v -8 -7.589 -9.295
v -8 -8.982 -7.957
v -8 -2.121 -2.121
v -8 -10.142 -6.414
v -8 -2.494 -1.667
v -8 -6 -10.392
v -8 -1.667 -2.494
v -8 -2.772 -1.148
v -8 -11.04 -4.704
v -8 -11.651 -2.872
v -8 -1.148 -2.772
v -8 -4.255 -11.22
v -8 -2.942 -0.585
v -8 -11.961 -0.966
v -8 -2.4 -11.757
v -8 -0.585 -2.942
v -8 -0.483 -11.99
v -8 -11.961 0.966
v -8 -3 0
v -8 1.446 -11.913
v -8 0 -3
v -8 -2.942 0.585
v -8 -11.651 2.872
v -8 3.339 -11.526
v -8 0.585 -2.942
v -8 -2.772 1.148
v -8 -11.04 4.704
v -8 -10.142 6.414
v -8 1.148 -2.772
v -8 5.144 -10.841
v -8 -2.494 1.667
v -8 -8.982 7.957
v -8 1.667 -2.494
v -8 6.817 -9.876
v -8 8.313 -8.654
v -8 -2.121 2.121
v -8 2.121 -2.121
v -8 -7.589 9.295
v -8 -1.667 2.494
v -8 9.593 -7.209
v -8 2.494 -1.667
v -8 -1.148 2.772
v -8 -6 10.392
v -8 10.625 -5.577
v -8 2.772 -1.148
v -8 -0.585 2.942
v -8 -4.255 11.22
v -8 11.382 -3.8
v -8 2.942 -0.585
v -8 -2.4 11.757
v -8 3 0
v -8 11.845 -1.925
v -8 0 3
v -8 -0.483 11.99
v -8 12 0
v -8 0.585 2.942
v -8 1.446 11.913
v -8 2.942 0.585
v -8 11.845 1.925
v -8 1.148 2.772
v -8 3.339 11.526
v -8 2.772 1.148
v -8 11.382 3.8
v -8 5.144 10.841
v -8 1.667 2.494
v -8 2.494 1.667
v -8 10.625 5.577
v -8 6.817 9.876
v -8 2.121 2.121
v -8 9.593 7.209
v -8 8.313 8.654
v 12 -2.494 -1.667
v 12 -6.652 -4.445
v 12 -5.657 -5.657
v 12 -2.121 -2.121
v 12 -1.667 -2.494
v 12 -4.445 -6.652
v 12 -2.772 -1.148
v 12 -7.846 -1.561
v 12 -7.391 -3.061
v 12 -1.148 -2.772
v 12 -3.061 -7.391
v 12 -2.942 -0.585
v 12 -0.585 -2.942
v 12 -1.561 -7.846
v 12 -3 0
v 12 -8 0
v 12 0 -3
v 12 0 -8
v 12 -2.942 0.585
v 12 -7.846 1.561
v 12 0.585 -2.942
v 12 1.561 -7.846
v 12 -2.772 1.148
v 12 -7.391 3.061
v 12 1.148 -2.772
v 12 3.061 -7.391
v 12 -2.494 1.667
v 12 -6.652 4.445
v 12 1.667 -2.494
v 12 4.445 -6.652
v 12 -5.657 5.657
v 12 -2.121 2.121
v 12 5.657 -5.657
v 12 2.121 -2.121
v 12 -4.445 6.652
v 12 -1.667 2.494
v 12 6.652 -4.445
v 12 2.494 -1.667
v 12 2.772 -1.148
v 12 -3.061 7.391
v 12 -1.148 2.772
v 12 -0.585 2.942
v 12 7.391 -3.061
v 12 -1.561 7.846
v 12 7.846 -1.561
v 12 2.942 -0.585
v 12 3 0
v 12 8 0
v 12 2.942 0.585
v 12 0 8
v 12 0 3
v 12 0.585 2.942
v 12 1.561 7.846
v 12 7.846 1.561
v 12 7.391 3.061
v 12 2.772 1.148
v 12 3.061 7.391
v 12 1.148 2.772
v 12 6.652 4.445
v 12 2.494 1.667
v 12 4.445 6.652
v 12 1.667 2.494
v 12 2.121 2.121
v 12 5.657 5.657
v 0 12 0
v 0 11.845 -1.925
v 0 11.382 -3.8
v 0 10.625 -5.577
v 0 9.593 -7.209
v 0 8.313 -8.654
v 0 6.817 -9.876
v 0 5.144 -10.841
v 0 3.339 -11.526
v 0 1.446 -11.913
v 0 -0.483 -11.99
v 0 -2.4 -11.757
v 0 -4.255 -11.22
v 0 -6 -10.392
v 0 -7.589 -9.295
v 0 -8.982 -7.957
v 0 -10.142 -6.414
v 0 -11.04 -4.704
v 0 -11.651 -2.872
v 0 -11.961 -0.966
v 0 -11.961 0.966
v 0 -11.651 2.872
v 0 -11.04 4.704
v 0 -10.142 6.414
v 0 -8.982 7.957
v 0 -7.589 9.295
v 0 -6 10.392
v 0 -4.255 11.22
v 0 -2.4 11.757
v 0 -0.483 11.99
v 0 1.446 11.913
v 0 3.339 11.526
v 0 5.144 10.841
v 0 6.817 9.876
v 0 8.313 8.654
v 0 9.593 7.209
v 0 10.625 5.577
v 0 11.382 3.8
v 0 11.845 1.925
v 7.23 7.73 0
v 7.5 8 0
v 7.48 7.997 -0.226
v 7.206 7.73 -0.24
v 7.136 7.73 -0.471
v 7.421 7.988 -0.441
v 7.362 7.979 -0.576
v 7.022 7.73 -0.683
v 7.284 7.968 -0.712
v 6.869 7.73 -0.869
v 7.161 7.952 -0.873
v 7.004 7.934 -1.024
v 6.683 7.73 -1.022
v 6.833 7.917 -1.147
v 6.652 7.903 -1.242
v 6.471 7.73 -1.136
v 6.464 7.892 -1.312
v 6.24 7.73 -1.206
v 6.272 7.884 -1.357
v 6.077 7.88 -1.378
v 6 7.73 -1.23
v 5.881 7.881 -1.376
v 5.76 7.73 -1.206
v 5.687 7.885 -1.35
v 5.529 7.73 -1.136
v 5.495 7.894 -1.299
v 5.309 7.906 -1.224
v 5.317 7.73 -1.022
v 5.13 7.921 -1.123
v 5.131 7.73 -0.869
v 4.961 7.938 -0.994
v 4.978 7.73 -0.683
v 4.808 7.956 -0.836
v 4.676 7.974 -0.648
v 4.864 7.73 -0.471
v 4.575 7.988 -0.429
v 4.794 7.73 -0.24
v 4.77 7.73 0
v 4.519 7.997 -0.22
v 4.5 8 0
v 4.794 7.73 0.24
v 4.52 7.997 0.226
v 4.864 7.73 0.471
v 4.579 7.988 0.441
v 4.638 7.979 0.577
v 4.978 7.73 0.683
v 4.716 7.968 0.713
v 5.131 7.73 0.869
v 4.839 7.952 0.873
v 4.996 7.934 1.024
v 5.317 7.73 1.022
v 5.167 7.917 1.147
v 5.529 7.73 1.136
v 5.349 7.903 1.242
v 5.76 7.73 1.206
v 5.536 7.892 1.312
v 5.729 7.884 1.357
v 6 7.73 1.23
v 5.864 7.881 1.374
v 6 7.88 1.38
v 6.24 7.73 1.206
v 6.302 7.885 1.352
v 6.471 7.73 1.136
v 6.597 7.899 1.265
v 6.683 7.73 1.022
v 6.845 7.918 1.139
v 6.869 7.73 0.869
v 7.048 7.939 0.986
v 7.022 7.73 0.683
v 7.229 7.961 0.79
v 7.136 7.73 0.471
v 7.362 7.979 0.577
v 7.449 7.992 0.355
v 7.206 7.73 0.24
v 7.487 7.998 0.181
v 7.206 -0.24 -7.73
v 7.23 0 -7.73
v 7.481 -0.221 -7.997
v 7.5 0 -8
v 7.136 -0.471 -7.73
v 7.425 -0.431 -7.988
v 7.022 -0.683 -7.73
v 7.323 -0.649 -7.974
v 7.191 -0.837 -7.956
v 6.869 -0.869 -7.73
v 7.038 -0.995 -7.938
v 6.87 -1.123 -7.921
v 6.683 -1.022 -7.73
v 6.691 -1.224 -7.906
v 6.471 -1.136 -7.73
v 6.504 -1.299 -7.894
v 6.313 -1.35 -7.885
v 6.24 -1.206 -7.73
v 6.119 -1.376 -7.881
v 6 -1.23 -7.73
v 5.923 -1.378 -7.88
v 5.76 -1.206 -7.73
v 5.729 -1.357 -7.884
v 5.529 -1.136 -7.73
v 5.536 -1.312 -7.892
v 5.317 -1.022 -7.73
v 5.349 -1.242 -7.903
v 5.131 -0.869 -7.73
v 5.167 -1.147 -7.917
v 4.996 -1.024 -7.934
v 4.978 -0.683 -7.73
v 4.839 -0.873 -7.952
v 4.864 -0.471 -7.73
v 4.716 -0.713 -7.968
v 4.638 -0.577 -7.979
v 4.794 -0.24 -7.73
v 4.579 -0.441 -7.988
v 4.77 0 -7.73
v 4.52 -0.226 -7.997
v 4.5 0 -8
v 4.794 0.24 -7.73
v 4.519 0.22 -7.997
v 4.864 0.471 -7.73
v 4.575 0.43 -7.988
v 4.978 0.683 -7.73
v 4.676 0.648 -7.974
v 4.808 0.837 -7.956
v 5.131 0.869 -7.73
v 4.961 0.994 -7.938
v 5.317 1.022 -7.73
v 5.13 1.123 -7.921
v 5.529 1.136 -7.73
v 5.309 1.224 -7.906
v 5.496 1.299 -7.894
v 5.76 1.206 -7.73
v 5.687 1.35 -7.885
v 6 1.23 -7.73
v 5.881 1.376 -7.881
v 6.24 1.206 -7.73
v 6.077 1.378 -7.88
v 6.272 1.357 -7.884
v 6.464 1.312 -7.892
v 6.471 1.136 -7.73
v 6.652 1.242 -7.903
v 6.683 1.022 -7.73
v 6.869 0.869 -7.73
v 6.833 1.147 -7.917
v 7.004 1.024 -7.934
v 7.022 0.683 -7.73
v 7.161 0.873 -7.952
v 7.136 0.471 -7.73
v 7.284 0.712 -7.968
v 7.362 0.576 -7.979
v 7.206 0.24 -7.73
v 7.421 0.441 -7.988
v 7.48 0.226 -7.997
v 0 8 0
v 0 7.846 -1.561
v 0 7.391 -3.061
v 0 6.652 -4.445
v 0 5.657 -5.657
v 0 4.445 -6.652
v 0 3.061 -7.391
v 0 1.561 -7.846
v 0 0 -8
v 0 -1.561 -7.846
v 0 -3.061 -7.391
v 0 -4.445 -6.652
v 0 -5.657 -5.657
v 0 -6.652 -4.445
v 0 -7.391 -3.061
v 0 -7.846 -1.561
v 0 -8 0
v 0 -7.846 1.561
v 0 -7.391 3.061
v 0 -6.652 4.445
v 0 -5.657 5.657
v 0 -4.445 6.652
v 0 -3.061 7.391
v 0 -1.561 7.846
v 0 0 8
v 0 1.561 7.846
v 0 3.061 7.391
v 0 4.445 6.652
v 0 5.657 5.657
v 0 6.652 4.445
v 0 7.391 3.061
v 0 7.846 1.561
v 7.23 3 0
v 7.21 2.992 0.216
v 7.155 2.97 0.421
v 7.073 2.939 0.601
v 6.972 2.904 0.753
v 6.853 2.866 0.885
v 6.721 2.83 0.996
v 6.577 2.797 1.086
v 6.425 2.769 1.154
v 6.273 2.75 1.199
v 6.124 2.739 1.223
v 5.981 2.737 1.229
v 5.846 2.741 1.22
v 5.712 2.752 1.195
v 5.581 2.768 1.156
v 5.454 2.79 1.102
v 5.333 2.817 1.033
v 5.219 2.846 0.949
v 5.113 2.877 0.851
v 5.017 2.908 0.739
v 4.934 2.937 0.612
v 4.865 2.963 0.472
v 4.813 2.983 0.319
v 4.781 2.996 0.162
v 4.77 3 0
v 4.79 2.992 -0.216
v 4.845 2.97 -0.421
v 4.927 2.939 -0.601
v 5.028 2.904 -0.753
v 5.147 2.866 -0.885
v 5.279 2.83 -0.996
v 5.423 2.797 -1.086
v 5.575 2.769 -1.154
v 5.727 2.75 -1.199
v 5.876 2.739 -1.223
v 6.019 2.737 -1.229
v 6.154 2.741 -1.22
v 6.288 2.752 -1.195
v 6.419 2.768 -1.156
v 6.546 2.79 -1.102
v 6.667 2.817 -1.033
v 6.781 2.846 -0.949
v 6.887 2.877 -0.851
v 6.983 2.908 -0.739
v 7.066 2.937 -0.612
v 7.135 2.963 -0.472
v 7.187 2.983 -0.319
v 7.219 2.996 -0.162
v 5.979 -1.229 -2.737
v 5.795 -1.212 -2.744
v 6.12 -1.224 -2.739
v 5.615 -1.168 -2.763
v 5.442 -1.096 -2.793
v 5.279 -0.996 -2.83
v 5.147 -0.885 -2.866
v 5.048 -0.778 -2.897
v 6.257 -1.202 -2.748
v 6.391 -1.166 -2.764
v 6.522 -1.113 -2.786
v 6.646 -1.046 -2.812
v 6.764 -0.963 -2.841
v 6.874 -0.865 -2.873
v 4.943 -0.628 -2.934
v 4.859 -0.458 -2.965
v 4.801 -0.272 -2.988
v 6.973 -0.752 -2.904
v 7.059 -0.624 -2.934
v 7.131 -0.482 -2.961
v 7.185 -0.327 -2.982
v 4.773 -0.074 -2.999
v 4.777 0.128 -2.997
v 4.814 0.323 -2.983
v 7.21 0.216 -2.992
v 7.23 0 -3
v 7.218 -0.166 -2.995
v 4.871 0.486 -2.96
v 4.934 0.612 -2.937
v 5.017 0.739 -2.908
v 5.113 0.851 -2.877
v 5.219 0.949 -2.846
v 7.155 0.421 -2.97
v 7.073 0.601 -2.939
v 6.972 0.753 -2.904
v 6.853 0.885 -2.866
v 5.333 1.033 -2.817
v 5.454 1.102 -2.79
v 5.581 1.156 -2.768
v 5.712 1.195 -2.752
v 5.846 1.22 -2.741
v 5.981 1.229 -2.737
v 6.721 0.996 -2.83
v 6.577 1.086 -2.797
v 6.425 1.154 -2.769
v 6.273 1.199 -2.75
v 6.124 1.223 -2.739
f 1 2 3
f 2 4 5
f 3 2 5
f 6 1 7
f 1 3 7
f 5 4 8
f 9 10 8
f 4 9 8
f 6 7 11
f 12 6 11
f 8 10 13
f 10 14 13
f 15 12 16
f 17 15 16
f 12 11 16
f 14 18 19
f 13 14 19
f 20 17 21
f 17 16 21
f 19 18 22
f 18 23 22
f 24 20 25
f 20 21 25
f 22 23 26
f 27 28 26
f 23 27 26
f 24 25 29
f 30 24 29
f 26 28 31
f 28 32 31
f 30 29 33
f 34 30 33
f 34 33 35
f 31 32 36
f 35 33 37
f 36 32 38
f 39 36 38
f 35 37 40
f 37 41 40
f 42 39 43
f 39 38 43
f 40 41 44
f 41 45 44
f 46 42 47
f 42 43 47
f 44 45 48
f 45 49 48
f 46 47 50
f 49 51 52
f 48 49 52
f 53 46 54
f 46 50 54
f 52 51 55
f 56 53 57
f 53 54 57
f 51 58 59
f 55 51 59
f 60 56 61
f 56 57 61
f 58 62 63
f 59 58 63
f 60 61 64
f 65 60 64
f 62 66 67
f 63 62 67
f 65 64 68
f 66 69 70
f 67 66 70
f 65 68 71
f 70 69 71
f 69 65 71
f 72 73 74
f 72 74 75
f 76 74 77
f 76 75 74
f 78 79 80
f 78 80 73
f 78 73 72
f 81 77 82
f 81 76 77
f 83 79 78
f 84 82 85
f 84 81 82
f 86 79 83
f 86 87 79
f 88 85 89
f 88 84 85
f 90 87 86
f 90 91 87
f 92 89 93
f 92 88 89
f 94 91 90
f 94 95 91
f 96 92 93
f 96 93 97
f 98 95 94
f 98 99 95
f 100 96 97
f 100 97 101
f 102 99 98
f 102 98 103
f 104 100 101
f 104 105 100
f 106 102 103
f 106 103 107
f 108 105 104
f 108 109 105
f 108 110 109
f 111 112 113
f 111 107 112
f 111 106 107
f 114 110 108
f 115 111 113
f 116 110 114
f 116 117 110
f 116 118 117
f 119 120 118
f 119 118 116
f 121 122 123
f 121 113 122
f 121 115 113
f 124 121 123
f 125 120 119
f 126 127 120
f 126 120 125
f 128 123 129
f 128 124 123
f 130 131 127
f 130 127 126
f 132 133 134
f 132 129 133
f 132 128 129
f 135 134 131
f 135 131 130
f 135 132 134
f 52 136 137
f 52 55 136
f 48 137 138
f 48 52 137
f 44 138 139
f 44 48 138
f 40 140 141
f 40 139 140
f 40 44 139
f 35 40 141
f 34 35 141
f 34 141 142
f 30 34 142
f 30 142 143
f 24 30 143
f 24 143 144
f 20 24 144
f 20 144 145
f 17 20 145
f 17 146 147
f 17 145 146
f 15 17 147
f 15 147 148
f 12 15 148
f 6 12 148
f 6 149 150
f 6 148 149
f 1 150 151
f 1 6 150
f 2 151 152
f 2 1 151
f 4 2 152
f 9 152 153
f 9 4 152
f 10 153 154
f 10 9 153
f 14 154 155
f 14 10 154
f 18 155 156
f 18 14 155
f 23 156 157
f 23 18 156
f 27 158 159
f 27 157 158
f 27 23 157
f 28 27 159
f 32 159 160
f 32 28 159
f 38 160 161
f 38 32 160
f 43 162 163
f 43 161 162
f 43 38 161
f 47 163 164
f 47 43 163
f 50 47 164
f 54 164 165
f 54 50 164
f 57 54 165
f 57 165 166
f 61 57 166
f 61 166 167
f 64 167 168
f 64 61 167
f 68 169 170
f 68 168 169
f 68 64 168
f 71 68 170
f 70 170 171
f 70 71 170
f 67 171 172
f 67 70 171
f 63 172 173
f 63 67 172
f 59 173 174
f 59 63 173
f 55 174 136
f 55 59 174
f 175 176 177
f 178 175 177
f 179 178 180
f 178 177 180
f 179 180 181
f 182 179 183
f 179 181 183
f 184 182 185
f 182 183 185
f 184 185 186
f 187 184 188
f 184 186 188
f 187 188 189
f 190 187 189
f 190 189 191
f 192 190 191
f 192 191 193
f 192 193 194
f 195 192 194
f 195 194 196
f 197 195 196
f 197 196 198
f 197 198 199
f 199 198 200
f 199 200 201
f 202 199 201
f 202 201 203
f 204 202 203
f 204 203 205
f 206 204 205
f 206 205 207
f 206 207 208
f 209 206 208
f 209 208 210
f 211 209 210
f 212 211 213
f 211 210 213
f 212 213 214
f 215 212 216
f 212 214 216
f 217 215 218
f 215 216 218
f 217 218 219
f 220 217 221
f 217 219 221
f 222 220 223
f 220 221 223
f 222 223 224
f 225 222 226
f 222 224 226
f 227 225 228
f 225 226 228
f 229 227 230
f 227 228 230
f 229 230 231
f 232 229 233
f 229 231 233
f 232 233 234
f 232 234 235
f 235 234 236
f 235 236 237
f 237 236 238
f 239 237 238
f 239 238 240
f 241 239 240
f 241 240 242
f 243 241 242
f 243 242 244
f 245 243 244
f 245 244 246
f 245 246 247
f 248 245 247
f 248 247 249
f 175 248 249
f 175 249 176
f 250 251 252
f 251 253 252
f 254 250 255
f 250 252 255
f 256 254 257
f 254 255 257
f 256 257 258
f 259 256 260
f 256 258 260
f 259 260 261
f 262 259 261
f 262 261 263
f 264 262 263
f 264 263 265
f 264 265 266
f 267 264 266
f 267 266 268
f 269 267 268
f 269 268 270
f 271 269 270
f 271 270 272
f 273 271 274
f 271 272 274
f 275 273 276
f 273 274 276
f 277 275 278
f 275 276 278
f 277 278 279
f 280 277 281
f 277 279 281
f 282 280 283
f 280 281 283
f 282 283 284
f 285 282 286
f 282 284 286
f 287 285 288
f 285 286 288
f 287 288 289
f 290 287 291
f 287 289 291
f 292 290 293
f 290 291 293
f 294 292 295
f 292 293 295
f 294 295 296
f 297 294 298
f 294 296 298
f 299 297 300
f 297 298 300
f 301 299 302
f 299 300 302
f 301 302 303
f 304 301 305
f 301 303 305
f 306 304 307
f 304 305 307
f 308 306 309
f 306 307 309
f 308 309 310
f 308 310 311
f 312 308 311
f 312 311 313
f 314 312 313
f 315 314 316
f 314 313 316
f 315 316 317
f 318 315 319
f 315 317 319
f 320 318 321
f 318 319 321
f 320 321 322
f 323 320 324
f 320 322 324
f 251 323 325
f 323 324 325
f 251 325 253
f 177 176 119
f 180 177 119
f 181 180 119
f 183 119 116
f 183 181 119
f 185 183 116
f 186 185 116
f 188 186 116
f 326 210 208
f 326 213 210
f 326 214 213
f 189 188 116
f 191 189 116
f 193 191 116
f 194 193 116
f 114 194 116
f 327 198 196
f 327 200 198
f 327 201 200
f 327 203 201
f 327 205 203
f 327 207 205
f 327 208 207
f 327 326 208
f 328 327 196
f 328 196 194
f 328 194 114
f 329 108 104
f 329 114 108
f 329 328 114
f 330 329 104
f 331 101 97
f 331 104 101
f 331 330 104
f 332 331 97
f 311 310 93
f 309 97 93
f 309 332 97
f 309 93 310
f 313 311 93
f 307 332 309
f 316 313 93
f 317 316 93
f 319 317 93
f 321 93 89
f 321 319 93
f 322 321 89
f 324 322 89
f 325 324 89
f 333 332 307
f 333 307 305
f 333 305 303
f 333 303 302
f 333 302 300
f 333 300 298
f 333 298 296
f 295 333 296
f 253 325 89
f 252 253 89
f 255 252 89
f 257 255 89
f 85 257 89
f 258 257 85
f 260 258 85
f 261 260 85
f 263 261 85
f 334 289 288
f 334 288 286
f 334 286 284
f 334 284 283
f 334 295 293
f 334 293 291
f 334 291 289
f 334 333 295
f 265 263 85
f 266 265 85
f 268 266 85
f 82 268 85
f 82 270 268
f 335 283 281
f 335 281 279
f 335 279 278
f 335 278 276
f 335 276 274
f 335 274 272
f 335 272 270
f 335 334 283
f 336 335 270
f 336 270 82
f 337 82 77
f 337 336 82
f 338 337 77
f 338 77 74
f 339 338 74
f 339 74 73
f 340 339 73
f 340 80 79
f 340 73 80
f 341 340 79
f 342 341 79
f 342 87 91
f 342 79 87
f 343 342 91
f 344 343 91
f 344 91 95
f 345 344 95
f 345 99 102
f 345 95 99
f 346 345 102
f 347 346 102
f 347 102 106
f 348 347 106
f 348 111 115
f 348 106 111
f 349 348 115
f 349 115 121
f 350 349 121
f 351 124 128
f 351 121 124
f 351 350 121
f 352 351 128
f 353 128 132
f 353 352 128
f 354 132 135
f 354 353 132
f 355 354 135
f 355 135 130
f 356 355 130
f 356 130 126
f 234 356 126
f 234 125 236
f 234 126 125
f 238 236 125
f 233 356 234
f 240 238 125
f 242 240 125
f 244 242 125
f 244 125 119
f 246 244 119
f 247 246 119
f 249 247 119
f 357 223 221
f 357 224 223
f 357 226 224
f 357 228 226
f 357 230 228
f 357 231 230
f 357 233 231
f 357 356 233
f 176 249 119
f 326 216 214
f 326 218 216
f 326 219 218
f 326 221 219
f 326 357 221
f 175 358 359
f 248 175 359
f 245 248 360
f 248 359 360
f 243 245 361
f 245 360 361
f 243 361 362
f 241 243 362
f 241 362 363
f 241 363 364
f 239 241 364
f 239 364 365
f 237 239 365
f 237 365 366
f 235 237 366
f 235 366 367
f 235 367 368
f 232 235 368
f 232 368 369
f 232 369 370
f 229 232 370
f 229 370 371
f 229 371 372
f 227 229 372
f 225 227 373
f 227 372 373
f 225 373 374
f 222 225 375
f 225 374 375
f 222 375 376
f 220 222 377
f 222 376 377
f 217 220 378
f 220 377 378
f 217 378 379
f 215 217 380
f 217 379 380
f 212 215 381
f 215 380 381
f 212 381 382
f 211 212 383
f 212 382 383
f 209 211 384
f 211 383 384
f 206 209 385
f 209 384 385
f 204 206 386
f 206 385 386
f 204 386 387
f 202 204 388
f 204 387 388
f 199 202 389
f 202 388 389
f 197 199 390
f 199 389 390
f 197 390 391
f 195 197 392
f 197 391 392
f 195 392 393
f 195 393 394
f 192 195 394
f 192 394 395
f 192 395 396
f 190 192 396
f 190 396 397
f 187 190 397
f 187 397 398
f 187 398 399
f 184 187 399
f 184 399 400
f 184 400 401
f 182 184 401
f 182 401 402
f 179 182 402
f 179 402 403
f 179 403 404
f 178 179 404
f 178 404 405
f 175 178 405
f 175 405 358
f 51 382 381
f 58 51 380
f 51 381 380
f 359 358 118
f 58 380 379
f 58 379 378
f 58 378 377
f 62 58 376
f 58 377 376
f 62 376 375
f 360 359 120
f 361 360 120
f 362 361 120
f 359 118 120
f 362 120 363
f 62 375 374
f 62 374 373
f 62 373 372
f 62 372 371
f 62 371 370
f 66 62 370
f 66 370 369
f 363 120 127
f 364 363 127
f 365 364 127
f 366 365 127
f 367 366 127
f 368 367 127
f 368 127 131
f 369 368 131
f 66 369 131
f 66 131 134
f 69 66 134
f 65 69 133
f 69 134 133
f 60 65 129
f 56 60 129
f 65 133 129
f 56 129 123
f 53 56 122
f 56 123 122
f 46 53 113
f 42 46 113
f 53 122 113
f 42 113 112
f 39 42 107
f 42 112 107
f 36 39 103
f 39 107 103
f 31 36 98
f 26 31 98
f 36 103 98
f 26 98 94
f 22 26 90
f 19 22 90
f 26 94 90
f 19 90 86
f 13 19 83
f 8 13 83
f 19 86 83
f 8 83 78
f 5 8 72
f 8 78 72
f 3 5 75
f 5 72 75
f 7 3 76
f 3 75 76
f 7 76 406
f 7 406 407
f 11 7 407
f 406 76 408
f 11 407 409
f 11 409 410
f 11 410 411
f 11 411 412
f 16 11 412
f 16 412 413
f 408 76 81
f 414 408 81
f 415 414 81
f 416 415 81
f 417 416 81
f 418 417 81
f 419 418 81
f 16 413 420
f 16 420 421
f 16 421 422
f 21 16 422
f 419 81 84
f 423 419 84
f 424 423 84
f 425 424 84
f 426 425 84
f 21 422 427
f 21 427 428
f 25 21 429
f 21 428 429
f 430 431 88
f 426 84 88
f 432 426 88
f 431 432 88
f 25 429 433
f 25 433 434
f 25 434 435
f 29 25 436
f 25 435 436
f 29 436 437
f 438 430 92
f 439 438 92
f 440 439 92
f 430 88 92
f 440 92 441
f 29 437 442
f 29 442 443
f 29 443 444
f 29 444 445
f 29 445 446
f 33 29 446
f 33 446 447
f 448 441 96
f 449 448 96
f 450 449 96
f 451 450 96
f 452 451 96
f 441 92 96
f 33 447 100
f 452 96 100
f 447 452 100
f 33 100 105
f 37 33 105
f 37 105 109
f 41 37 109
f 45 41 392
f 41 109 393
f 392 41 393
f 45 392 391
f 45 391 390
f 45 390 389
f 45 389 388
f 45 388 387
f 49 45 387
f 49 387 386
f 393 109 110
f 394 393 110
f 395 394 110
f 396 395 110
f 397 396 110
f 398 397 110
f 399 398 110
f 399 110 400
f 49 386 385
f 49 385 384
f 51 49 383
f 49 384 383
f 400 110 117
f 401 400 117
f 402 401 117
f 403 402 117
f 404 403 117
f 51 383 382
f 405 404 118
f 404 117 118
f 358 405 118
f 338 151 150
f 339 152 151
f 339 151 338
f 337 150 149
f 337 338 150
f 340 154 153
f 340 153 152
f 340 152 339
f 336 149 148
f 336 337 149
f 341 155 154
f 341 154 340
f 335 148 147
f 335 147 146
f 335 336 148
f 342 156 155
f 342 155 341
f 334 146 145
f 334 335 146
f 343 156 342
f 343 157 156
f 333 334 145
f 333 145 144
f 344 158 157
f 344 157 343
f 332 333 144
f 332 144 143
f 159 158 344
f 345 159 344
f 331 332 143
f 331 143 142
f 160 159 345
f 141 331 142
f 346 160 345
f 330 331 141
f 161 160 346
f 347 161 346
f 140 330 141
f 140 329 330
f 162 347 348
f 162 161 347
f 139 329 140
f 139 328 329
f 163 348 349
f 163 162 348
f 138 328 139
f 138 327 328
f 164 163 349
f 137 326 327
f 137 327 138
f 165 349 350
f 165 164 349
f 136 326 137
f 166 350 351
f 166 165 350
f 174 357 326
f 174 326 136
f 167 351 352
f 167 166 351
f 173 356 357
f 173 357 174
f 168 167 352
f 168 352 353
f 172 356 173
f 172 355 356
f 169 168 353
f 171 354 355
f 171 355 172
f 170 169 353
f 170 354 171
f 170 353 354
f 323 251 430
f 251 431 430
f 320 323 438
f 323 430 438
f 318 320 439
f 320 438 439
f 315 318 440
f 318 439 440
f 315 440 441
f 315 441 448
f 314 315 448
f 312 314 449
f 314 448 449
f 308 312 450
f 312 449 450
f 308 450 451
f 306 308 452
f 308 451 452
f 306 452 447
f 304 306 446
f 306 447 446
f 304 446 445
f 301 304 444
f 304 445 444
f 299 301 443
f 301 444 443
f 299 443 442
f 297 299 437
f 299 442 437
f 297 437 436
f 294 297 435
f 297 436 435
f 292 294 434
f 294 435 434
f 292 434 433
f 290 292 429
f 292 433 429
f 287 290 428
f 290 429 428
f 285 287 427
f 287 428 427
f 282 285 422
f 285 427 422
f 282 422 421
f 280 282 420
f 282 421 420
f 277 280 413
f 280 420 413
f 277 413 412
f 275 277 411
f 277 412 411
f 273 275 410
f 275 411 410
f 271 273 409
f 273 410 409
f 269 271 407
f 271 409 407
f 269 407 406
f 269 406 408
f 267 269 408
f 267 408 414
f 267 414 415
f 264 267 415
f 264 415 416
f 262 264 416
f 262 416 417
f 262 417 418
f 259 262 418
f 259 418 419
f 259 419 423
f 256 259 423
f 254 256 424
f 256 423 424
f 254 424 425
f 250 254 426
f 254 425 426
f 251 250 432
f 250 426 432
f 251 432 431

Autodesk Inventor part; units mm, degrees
sketch "Sketch_2" plane through (0, 0, 0) normal (0, 0, 1) x (1, 0, 0)
  line L0 (12, 0) -> (-8, 0)
  line L1 (-8, 12) -> (-8, 3)
  line L2 (-8, 3) -> (12, 3)
  line L3 (12, 3) -> (12, 8)
  line L4 (12, 8) -> (0, 8)
  line L5 (0, 8) -> (0, 12)
  line L6 (0, 12) -> (-8, 12)
revolve "Revolution1" add sketch "Sketch_2" angle 360 about axis through (12, 0, 0) along (1, 0, 0)
sketch "Sketch_4" plane through (0, 0, 0) normal (0, 0, 1) x (1, 0, 0)
  line L0 (6, 0) -> (6, 8)
  line L1 (6, 8) -> (7.5, 8)
  line L2 (7.5, 8) -> (7.2295, 7.7295)
  line L3 (7.2295, 7.7295) -> (7.2295, 0)
  line L4 (7.2295, 0) -> (6, 0)
  line L5 (6, 0) -> (6, 8)
revolve "Revolution2" cut sketch "Sketch_4" angle 360 about axis through (6, 0, 0) along (0, -1, 0)
sketch "Sketch_5" plane through (0, 0, 0) normal (0, 1, 0) x (-1, 0, 0)
  line L0 (-6, 0) -> (-6, -8)
  line L1 (-6, -8) -> (-7.5, -8)
  line L2 (-7.5, -8) -> (-7.2295, -7.7295)
  line L3 (-7.2295, -7.7295) -> (-7.2295, 0)
  line L4 (-7.2295, 0) -> (-6, 0)
  line L5 (-6, 0) -> (-6, -8)
revolve "Revolution3" cut sketch "Sketch_5" angle 360 about axis through (6, 0, 0) along (0, 0, 1)
thread "Thread1" size "M3x0.5" class "6H" standard "ISO Metric profile" length 4.7295
ref_plane "c_k_XY" through (-4, 0, 0) normal (1, 0, 0) x (0, 0, -1)
ref_plane "c_k_YZ" through (-4, 0, 0) normal (0, 0, -1) x (0, 1, 0)
ref_plane "c_k_ZX" through (-4, 0, 0) normal (0, 1, 0) x (1, 0, 0)
properties part number "UMHSL30_c"
